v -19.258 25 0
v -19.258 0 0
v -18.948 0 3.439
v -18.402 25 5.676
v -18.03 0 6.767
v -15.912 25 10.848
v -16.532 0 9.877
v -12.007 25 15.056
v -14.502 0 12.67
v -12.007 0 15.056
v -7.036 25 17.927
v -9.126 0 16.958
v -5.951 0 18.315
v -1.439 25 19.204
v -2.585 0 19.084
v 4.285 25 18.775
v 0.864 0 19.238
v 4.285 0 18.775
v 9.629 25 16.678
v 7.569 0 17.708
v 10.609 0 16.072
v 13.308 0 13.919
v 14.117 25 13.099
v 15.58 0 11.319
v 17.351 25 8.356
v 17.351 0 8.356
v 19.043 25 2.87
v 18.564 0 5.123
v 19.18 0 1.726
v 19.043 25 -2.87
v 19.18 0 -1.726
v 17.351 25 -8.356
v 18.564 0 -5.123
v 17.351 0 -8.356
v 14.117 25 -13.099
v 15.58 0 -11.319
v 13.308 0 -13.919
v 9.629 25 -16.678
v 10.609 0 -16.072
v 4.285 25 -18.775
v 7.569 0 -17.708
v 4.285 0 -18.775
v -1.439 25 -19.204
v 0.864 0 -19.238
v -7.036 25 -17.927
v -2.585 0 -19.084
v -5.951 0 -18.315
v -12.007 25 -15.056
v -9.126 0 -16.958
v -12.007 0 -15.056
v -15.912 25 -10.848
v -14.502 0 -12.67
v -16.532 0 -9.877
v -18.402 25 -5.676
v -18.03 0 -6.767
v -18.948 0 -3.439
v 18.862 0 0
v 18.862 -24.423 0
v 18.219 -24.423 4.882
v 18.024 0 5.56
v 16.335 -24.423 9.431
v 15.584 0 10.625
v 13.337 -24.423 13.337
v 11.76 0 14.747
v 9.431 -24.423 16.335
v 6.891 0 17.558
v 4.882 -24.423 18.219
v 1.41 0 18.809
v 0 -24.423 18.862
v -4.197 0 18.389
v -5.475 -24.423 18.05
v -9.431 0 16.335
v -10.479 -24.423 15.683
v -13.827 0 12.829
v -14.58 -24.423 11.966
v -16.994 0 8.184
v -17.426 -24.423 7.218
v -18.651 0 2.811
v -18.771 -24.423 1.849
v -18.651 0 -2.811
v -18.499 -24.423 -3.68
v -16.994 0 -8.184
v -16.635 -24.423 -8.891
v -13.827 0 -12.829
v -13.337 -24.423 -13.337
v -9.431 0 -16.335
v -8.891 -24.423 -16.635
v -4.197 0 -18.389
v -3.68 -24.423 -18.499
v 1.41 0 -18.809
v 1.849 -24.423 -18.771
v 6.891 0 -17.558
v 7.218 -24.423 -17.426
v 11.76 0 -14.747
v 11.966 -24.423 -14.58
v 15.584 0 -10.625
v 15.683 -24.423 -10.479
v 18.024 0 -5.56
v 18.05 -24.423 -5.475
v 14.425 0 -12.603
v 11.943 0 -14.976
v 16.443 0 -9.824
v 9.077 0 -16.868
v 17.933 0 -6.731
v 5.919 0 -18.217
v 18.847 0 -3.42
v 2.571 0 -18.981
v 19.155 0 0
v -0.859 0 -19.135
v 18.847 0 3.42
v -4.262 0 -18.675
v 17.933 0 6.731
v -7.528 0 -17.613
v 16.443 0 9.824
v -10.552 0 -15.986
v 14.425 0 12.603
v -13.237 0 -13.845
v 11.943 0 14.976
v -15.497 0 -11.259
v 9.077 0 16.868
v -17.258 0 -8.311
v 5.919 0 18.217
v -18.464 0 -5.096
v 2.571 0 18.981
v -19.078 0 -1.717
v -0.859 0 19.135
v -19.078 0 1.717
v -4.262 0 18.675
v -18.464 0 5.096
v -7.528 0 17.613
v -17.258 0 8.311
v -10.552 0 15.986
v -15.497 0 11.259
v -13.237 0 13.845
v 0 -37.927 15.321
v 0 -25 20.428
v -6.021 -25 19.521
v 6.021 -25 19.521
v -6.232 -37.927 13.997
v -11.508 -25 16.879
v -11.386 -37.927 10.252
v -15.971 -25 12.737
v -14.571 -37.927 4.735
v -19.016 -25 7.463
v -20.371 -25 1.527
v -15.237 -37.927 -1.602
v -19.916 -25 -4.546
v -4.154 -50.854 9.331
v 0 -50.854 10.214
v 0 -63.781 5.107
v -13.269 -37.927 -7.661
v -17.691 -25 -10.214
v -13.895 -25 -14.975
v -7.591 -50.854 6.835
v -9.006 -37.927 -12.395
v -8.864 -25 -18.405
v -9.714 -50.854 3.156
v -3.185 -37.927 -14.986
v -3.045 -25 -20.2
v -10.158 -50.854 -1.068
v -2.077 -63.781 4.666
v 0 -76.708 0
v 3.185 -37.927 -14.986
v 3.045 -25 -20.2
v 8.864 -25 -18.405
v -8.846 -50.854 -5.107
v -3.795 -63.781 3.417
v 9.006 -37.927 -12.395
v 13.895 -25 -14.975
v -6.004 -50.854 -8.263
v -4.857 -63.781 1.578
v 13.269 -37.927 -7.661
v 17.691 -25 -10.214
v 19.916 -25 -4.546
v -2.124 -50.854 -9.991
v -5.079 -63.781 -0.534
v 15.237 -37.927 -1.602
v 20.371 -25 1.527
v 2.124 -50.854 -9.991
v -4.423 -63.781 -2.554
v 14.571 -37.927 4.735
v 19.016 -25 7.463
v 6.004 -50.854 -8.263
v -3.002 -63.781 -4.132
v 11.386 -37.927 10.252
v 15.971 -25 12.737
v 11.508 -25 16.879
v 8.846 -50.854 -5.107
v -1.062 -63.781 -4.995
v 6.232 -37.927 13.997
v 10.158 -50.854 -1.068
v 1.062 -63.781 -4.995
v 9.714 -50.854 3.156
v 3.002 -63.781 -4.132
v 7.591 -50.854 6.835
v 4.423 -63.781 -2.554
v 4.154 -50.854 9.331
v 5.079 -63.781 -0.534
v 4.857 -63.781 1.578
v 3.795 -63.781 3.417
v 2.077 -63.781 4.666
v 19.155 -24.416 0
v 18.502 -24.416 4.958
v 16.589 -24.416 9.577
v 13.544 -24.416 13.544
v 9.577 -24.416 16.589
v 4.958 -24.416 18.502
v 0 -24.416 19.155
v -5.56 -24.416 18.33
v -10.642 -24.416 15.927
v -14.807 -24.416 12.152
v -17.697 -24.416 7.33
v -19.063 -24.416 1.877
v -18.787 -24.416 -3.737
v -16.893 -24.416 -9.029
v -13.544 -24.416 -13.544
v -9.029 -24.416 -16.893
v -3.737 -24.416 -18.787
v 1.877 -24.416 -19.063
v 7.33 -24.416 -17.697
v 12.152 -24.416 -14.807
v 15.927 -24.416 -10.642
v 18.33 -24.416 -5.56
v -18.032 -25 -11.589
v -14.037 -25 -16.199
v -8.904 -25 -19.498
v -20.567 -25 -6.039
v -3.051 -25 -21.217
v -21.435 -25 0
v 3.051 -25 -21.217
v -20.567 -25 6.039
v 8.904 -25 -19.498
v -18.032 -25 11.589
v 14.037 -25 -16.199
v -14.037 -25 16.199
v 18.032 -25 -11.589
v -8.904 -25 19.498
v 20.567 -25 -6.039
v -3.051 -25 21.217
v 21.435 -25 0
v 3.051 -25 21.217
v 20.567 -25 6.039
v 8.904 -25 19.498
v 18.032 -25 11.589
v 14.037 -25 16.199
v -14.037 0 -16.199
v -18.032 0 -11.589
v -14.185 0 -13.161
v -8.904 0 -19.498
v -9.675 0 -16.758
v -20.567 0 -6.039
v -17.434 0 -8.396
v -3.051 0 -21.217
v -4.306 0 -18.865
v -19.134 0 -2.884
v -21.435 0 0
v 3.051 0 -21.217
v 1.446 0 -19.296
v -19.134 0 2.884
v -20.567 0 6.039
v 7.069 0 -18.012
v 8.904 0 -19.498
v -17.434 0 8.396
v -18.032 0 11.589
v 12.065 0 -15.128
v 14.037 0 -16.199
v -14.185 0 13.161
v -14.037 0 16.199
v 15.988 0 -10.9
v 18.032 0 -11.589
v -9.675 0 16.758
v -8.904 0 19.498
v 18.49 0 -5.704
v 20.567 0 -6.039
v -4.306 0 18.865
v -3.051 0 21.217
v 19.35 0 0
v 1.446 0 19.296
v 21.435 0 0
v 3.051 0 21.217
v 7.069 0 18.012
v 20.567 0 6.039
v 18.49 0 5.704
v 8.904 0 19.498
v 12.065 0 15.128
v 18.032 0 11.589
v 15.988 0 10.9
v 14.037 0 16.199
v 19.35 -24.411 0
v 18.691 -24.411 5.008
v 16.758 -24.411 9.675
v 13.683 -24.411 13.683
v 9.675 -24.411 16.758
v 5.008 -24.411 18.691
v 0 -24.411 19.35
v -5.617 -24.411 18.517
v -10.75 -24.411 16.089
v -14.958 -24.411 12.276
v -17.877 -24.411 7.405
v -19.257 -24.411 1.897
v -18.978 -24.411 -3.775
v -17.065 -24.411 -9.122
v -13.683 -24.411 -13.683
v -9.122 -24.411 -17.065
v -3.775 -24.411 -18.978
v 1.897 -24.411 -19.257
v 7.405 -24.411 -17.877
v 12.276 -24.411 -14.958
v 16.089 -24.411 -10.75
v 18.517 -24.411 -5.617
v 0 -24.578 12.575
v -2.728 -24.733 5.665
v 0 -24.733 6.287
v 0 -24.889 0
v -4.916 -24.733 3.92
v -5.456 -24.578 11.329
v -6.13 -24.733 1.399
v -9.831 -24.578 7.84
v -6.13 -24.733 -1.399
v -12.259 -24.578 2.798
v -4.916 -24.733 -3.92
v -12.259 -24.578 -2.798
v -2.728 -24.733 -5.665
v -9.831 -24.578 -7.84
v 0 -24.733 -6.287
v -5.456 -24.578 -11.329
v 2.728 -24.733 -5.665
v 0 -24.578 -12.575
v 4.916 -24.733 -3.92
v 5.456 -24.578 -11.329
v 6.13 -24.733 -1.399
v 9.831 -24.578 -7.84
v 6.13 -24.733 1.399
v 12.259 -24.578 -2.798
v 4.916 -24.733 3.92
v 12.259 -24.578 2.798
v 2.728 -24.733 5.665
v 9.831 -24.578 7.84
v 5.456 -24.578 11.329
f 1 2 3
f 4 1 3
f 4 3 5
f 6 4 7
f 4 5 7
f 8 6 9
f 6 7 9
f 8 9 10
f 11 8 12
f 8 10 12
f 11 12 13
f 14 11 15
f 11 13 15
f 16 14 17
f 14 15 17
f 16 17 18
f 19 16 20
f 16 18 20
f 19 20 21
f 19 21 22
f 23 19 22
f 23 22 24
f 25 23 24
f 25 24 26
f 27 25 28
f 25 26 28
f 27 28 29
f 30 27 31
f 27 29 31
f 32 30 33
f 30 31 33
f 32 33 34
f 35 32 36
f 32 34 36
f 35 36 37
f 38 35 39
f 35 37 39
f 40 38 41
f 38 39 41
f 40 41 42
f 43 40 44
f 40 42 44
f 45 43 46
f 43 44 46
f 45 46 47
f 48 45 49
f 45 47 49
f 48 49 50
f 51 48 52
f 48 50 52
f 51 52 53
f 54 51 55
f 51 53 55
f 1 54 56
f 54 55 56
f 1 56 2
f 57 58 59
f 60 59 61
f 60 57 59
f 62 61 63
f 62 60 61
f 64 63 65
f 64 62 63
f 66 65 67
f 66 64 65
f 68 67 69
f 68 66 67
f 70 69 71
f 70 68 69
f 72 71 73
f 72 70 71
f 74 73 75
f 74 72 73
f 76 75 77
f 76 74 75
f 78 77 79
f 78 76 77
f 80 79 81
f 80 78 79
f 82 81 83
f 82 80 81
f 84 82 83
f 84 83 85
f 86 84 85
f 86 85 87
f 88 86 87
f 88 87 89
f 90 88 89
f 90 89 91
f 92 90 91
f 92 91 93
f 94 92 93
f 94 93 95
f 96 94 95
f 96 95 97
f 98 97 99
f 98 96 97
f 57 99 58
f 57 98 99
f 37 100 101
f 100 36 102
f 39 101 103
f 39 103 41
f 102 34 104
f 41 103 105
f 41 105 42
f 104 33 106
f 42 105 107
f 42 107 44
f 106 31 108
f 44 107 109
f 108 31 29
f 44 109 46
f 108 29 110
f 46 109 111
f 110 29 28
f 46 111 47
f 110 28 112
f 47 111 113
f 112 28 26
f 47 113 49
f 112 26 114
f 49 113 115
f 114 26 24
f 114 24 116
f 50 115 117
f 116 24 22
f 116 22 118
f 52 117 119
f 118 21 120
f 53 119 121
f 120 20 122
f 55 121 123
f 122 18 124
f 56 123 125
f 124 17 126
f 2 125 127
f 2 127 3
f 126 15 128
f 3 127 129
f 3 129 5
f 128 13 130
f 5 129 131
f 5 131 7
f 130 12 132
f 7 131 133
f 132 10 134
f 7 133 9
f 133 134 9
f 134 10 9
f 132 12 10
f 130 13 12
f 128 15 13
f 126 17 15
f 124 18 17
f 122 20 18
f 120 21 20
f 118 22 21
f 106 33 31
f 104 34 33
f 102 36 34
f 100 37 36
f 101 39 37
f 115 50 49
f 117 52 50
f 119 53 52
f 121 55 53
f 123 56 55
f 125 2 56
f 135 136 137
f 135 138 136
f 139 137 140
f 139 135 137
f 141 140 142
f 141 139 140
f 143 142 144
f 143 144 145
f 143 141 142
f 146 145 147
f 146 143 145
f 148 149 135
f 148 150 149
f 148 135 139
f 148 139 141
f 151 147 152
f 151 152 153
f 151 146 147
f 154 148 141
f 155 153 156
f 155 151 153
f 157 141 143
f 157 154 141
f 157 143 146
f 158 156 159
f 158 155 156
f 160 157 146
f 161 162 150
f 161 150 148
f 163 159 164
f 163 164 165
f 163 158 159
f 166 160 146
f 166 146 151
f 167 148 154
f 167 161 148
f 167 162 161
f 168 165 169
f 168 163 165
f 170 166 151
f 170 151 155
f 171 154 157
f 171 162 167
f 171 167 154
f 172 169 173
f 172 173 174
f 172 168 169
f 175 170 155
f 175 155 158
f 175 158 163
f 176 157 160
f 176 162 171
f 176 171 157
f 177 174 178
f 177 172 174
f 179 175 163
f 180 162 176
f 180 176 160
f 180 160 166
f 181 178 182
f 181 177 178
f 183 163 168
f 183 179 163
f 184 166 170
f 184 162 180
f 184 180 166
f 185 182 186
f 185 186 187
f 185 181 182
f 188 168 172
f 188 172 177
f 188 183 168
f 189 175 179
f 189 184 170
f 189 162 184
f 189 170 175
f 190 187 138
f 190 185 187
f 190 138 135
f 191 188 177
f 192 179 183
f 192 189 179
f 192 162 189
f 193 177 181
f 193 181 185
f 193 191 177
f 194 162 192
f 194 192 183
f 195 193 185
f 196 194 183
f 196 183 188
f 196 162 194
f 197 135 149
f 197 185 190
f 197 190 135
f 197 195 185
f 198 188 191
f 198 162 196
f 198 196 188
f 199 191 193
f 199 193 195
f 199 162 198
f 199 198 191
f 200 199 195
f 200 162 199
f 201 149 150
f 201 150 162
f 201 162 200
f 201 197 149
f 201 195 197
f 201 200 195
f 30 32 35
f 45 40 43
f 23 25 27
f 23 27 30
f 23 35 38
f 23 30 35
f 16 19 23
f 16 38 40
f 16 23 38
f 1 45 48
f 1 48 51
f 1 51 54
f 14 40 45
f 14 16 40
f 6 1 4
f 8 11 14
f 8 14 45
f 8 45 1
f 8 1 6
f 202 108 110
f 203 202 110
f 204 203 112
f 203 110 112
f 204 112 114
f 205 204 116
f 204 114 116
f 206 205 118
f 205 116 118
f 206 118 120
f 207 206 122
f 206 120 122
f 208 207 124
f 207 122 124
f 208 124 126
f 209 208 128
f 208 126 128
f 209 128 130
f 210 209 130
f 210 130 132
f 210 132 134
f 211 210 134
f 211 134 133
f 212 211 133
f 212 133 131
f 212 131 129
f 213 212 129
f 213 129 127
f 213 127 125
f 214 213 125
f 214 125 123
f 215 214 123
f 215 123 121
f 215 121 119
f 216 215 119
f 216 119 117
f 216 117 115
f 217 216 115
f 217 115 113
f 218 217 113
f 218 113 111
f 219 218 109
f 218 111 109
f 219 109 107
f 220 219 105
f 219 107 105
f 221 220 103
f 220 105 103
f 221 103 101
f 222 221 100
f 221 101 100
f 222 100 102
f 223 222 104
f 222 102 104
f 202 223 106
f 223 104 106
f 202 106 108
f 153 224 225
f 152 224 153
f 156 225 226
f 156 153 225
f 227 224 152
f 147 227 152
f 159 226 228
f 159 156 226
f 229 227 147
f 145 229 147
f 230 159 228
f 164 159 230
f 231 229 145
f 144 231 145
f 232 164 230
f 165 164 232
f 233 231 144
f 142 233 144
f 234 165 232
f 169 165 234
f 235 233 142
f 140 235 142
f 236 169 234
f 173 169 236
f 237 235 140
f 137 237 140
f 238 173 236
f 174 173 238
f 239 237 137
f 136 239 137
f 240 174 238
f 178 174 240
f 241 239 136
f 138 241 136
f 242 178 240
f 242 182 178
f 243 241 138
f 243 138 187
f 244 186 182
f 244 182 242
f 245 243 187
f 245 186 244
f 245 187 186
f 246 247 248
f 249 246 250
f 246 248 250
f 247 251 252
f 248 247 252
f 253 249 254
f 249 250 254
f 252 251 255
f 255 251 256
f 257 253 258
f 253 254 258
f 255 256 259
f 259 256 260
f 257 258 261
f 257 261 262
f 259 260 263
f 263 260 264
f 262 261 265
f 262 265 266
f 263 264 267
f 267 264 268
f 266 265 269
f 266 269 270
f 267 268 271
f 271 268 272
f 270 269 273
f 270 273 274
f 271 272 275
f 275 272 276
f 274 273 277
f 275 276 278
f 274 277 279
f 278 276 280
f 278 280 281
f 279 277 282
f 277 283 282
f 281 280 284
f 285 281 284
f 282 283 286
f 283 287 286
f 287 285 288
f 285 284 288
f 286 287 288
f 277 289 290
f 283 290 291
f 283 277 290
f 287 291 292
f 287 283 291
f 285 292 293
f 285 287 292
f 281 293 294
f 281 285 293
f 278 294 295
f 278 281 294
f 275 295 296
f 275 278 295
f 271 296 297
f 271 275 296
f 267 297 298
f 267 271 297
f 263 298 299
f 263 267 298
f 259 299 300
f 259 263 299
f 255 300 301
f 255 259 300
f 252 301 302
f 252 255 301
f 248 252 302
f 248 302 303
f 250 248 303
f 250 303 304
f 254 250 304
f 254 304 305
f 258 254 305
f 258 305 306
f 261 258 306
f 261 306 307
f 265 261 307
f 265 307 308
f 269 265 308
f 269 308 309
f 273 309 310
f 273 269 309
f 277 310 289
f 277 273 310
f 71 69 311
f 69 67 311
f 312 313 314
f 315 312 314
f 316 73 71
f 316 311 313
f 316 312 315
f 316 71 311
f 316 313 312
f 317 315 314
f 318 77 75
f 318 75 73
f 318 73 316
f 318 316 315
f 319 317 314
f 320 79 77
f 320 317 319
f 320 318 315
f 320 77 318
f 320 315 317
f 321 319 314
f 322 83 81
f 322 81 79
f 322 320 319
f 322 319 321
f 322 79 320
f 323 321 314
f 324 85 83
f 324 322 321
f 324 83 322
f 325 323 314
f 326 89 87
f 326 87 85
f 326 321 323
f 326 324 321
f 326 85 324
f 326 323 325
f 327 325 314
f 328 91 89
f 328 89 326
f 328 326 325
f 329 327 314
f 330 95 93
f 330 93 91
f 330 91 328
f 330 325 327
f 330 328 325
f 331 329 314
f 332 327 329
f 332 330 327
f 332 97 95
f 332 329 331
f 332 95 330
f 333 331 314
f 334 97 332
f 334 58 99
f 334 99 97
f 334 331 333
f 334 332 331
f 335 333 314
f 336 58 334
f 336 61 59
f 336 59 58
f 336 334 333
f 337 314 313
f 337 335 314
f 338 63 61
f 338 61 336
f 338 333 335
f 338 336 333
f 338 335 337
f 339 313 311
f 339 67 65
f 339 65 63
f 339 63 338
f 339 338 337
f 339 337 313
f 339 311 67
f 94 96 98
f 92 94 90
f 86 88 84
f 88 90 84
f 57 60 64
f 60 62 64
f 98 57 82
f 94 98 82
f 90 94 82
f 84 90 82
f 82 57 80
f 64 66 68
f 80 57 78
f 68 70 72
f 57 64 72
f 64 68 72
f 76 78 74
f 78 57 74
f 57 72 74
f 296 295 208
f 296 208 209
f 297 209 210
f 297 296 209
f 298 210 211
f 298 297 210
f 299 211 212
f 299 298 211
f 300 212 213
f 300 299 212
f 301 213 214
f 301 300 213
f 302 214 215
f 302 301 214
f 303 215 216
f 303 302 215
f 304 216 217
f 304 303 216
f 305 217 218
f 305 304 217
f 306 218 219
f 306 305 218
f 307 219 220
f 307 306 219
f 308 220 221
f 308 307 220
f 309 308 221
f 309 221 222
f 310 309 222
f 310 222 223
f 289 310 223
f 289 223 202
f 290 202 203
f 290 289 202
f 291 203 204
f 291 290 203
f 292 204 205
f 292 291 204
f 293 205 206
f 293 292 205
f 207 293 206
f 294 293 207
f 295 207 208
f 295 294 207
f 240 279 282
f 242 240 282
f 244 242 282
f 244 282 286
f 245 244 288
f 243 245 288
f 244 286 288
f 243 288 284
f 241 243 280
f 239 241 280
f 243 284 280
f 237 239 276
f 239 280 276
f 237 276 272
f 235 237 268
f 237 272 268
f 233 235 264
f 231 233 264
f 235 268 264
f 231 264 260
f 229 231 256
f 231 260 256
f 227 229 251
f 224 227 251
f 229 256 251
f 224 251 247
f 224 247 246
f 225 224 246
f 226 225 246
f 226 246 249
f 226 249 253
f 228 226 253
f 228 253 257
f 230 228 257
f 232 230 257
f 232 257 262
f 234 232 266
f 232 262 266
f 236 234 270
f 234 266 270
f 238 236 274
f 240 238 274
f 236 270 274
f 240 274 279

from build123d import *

# Parameters (mm, degrees)
F0_R     = 21.435
F0_R_2   = 19.35
F1_DEPTH = 25
F5_R     = 19.154771
F5_R_2   = 18.861777
F6_DEPTH = 25
F4_R     = 19.257792
F7_DEPTH = 25


with BuildPart() as f1:
    # F0 (on Front) → F1 (new body)
    with BuildSketch(Plane.XZ):
        Circle(F0_R)
        Circle(F0_R_2, mode=Mode.SUBTRACT)
    extrude(amount=F1_DEPTH)

    # F2 (on Right) → F3 (revolve)
    with BuildSketch(Plane.YZ):
        Polygon((-76.707862, 0), (-24.888575, 0), (-24.378041, 20.674003), align=None)
    revolve(axis=Axis((0, -6.062602, 0), (0, -1, 0)))

    # F5 (on Front) → F6 (join)
    with BuildSketch(Plane.XZ):
        Circle(F5_R)
        Circle(F5_R_2, mode=Mode.SUBTRACT)
    extrude(amount=F6_DEPTH)

    # F4 (on face) → F7 (join)
    with BuildSketch(Plane(origin=(0, 0, 0), x_dir=(-1, 0, 0), z_dir=(0, 1, 0))):
        Circle(F4_R)
    extrude(amount=F7_DEPTH)


solid = f1.part
